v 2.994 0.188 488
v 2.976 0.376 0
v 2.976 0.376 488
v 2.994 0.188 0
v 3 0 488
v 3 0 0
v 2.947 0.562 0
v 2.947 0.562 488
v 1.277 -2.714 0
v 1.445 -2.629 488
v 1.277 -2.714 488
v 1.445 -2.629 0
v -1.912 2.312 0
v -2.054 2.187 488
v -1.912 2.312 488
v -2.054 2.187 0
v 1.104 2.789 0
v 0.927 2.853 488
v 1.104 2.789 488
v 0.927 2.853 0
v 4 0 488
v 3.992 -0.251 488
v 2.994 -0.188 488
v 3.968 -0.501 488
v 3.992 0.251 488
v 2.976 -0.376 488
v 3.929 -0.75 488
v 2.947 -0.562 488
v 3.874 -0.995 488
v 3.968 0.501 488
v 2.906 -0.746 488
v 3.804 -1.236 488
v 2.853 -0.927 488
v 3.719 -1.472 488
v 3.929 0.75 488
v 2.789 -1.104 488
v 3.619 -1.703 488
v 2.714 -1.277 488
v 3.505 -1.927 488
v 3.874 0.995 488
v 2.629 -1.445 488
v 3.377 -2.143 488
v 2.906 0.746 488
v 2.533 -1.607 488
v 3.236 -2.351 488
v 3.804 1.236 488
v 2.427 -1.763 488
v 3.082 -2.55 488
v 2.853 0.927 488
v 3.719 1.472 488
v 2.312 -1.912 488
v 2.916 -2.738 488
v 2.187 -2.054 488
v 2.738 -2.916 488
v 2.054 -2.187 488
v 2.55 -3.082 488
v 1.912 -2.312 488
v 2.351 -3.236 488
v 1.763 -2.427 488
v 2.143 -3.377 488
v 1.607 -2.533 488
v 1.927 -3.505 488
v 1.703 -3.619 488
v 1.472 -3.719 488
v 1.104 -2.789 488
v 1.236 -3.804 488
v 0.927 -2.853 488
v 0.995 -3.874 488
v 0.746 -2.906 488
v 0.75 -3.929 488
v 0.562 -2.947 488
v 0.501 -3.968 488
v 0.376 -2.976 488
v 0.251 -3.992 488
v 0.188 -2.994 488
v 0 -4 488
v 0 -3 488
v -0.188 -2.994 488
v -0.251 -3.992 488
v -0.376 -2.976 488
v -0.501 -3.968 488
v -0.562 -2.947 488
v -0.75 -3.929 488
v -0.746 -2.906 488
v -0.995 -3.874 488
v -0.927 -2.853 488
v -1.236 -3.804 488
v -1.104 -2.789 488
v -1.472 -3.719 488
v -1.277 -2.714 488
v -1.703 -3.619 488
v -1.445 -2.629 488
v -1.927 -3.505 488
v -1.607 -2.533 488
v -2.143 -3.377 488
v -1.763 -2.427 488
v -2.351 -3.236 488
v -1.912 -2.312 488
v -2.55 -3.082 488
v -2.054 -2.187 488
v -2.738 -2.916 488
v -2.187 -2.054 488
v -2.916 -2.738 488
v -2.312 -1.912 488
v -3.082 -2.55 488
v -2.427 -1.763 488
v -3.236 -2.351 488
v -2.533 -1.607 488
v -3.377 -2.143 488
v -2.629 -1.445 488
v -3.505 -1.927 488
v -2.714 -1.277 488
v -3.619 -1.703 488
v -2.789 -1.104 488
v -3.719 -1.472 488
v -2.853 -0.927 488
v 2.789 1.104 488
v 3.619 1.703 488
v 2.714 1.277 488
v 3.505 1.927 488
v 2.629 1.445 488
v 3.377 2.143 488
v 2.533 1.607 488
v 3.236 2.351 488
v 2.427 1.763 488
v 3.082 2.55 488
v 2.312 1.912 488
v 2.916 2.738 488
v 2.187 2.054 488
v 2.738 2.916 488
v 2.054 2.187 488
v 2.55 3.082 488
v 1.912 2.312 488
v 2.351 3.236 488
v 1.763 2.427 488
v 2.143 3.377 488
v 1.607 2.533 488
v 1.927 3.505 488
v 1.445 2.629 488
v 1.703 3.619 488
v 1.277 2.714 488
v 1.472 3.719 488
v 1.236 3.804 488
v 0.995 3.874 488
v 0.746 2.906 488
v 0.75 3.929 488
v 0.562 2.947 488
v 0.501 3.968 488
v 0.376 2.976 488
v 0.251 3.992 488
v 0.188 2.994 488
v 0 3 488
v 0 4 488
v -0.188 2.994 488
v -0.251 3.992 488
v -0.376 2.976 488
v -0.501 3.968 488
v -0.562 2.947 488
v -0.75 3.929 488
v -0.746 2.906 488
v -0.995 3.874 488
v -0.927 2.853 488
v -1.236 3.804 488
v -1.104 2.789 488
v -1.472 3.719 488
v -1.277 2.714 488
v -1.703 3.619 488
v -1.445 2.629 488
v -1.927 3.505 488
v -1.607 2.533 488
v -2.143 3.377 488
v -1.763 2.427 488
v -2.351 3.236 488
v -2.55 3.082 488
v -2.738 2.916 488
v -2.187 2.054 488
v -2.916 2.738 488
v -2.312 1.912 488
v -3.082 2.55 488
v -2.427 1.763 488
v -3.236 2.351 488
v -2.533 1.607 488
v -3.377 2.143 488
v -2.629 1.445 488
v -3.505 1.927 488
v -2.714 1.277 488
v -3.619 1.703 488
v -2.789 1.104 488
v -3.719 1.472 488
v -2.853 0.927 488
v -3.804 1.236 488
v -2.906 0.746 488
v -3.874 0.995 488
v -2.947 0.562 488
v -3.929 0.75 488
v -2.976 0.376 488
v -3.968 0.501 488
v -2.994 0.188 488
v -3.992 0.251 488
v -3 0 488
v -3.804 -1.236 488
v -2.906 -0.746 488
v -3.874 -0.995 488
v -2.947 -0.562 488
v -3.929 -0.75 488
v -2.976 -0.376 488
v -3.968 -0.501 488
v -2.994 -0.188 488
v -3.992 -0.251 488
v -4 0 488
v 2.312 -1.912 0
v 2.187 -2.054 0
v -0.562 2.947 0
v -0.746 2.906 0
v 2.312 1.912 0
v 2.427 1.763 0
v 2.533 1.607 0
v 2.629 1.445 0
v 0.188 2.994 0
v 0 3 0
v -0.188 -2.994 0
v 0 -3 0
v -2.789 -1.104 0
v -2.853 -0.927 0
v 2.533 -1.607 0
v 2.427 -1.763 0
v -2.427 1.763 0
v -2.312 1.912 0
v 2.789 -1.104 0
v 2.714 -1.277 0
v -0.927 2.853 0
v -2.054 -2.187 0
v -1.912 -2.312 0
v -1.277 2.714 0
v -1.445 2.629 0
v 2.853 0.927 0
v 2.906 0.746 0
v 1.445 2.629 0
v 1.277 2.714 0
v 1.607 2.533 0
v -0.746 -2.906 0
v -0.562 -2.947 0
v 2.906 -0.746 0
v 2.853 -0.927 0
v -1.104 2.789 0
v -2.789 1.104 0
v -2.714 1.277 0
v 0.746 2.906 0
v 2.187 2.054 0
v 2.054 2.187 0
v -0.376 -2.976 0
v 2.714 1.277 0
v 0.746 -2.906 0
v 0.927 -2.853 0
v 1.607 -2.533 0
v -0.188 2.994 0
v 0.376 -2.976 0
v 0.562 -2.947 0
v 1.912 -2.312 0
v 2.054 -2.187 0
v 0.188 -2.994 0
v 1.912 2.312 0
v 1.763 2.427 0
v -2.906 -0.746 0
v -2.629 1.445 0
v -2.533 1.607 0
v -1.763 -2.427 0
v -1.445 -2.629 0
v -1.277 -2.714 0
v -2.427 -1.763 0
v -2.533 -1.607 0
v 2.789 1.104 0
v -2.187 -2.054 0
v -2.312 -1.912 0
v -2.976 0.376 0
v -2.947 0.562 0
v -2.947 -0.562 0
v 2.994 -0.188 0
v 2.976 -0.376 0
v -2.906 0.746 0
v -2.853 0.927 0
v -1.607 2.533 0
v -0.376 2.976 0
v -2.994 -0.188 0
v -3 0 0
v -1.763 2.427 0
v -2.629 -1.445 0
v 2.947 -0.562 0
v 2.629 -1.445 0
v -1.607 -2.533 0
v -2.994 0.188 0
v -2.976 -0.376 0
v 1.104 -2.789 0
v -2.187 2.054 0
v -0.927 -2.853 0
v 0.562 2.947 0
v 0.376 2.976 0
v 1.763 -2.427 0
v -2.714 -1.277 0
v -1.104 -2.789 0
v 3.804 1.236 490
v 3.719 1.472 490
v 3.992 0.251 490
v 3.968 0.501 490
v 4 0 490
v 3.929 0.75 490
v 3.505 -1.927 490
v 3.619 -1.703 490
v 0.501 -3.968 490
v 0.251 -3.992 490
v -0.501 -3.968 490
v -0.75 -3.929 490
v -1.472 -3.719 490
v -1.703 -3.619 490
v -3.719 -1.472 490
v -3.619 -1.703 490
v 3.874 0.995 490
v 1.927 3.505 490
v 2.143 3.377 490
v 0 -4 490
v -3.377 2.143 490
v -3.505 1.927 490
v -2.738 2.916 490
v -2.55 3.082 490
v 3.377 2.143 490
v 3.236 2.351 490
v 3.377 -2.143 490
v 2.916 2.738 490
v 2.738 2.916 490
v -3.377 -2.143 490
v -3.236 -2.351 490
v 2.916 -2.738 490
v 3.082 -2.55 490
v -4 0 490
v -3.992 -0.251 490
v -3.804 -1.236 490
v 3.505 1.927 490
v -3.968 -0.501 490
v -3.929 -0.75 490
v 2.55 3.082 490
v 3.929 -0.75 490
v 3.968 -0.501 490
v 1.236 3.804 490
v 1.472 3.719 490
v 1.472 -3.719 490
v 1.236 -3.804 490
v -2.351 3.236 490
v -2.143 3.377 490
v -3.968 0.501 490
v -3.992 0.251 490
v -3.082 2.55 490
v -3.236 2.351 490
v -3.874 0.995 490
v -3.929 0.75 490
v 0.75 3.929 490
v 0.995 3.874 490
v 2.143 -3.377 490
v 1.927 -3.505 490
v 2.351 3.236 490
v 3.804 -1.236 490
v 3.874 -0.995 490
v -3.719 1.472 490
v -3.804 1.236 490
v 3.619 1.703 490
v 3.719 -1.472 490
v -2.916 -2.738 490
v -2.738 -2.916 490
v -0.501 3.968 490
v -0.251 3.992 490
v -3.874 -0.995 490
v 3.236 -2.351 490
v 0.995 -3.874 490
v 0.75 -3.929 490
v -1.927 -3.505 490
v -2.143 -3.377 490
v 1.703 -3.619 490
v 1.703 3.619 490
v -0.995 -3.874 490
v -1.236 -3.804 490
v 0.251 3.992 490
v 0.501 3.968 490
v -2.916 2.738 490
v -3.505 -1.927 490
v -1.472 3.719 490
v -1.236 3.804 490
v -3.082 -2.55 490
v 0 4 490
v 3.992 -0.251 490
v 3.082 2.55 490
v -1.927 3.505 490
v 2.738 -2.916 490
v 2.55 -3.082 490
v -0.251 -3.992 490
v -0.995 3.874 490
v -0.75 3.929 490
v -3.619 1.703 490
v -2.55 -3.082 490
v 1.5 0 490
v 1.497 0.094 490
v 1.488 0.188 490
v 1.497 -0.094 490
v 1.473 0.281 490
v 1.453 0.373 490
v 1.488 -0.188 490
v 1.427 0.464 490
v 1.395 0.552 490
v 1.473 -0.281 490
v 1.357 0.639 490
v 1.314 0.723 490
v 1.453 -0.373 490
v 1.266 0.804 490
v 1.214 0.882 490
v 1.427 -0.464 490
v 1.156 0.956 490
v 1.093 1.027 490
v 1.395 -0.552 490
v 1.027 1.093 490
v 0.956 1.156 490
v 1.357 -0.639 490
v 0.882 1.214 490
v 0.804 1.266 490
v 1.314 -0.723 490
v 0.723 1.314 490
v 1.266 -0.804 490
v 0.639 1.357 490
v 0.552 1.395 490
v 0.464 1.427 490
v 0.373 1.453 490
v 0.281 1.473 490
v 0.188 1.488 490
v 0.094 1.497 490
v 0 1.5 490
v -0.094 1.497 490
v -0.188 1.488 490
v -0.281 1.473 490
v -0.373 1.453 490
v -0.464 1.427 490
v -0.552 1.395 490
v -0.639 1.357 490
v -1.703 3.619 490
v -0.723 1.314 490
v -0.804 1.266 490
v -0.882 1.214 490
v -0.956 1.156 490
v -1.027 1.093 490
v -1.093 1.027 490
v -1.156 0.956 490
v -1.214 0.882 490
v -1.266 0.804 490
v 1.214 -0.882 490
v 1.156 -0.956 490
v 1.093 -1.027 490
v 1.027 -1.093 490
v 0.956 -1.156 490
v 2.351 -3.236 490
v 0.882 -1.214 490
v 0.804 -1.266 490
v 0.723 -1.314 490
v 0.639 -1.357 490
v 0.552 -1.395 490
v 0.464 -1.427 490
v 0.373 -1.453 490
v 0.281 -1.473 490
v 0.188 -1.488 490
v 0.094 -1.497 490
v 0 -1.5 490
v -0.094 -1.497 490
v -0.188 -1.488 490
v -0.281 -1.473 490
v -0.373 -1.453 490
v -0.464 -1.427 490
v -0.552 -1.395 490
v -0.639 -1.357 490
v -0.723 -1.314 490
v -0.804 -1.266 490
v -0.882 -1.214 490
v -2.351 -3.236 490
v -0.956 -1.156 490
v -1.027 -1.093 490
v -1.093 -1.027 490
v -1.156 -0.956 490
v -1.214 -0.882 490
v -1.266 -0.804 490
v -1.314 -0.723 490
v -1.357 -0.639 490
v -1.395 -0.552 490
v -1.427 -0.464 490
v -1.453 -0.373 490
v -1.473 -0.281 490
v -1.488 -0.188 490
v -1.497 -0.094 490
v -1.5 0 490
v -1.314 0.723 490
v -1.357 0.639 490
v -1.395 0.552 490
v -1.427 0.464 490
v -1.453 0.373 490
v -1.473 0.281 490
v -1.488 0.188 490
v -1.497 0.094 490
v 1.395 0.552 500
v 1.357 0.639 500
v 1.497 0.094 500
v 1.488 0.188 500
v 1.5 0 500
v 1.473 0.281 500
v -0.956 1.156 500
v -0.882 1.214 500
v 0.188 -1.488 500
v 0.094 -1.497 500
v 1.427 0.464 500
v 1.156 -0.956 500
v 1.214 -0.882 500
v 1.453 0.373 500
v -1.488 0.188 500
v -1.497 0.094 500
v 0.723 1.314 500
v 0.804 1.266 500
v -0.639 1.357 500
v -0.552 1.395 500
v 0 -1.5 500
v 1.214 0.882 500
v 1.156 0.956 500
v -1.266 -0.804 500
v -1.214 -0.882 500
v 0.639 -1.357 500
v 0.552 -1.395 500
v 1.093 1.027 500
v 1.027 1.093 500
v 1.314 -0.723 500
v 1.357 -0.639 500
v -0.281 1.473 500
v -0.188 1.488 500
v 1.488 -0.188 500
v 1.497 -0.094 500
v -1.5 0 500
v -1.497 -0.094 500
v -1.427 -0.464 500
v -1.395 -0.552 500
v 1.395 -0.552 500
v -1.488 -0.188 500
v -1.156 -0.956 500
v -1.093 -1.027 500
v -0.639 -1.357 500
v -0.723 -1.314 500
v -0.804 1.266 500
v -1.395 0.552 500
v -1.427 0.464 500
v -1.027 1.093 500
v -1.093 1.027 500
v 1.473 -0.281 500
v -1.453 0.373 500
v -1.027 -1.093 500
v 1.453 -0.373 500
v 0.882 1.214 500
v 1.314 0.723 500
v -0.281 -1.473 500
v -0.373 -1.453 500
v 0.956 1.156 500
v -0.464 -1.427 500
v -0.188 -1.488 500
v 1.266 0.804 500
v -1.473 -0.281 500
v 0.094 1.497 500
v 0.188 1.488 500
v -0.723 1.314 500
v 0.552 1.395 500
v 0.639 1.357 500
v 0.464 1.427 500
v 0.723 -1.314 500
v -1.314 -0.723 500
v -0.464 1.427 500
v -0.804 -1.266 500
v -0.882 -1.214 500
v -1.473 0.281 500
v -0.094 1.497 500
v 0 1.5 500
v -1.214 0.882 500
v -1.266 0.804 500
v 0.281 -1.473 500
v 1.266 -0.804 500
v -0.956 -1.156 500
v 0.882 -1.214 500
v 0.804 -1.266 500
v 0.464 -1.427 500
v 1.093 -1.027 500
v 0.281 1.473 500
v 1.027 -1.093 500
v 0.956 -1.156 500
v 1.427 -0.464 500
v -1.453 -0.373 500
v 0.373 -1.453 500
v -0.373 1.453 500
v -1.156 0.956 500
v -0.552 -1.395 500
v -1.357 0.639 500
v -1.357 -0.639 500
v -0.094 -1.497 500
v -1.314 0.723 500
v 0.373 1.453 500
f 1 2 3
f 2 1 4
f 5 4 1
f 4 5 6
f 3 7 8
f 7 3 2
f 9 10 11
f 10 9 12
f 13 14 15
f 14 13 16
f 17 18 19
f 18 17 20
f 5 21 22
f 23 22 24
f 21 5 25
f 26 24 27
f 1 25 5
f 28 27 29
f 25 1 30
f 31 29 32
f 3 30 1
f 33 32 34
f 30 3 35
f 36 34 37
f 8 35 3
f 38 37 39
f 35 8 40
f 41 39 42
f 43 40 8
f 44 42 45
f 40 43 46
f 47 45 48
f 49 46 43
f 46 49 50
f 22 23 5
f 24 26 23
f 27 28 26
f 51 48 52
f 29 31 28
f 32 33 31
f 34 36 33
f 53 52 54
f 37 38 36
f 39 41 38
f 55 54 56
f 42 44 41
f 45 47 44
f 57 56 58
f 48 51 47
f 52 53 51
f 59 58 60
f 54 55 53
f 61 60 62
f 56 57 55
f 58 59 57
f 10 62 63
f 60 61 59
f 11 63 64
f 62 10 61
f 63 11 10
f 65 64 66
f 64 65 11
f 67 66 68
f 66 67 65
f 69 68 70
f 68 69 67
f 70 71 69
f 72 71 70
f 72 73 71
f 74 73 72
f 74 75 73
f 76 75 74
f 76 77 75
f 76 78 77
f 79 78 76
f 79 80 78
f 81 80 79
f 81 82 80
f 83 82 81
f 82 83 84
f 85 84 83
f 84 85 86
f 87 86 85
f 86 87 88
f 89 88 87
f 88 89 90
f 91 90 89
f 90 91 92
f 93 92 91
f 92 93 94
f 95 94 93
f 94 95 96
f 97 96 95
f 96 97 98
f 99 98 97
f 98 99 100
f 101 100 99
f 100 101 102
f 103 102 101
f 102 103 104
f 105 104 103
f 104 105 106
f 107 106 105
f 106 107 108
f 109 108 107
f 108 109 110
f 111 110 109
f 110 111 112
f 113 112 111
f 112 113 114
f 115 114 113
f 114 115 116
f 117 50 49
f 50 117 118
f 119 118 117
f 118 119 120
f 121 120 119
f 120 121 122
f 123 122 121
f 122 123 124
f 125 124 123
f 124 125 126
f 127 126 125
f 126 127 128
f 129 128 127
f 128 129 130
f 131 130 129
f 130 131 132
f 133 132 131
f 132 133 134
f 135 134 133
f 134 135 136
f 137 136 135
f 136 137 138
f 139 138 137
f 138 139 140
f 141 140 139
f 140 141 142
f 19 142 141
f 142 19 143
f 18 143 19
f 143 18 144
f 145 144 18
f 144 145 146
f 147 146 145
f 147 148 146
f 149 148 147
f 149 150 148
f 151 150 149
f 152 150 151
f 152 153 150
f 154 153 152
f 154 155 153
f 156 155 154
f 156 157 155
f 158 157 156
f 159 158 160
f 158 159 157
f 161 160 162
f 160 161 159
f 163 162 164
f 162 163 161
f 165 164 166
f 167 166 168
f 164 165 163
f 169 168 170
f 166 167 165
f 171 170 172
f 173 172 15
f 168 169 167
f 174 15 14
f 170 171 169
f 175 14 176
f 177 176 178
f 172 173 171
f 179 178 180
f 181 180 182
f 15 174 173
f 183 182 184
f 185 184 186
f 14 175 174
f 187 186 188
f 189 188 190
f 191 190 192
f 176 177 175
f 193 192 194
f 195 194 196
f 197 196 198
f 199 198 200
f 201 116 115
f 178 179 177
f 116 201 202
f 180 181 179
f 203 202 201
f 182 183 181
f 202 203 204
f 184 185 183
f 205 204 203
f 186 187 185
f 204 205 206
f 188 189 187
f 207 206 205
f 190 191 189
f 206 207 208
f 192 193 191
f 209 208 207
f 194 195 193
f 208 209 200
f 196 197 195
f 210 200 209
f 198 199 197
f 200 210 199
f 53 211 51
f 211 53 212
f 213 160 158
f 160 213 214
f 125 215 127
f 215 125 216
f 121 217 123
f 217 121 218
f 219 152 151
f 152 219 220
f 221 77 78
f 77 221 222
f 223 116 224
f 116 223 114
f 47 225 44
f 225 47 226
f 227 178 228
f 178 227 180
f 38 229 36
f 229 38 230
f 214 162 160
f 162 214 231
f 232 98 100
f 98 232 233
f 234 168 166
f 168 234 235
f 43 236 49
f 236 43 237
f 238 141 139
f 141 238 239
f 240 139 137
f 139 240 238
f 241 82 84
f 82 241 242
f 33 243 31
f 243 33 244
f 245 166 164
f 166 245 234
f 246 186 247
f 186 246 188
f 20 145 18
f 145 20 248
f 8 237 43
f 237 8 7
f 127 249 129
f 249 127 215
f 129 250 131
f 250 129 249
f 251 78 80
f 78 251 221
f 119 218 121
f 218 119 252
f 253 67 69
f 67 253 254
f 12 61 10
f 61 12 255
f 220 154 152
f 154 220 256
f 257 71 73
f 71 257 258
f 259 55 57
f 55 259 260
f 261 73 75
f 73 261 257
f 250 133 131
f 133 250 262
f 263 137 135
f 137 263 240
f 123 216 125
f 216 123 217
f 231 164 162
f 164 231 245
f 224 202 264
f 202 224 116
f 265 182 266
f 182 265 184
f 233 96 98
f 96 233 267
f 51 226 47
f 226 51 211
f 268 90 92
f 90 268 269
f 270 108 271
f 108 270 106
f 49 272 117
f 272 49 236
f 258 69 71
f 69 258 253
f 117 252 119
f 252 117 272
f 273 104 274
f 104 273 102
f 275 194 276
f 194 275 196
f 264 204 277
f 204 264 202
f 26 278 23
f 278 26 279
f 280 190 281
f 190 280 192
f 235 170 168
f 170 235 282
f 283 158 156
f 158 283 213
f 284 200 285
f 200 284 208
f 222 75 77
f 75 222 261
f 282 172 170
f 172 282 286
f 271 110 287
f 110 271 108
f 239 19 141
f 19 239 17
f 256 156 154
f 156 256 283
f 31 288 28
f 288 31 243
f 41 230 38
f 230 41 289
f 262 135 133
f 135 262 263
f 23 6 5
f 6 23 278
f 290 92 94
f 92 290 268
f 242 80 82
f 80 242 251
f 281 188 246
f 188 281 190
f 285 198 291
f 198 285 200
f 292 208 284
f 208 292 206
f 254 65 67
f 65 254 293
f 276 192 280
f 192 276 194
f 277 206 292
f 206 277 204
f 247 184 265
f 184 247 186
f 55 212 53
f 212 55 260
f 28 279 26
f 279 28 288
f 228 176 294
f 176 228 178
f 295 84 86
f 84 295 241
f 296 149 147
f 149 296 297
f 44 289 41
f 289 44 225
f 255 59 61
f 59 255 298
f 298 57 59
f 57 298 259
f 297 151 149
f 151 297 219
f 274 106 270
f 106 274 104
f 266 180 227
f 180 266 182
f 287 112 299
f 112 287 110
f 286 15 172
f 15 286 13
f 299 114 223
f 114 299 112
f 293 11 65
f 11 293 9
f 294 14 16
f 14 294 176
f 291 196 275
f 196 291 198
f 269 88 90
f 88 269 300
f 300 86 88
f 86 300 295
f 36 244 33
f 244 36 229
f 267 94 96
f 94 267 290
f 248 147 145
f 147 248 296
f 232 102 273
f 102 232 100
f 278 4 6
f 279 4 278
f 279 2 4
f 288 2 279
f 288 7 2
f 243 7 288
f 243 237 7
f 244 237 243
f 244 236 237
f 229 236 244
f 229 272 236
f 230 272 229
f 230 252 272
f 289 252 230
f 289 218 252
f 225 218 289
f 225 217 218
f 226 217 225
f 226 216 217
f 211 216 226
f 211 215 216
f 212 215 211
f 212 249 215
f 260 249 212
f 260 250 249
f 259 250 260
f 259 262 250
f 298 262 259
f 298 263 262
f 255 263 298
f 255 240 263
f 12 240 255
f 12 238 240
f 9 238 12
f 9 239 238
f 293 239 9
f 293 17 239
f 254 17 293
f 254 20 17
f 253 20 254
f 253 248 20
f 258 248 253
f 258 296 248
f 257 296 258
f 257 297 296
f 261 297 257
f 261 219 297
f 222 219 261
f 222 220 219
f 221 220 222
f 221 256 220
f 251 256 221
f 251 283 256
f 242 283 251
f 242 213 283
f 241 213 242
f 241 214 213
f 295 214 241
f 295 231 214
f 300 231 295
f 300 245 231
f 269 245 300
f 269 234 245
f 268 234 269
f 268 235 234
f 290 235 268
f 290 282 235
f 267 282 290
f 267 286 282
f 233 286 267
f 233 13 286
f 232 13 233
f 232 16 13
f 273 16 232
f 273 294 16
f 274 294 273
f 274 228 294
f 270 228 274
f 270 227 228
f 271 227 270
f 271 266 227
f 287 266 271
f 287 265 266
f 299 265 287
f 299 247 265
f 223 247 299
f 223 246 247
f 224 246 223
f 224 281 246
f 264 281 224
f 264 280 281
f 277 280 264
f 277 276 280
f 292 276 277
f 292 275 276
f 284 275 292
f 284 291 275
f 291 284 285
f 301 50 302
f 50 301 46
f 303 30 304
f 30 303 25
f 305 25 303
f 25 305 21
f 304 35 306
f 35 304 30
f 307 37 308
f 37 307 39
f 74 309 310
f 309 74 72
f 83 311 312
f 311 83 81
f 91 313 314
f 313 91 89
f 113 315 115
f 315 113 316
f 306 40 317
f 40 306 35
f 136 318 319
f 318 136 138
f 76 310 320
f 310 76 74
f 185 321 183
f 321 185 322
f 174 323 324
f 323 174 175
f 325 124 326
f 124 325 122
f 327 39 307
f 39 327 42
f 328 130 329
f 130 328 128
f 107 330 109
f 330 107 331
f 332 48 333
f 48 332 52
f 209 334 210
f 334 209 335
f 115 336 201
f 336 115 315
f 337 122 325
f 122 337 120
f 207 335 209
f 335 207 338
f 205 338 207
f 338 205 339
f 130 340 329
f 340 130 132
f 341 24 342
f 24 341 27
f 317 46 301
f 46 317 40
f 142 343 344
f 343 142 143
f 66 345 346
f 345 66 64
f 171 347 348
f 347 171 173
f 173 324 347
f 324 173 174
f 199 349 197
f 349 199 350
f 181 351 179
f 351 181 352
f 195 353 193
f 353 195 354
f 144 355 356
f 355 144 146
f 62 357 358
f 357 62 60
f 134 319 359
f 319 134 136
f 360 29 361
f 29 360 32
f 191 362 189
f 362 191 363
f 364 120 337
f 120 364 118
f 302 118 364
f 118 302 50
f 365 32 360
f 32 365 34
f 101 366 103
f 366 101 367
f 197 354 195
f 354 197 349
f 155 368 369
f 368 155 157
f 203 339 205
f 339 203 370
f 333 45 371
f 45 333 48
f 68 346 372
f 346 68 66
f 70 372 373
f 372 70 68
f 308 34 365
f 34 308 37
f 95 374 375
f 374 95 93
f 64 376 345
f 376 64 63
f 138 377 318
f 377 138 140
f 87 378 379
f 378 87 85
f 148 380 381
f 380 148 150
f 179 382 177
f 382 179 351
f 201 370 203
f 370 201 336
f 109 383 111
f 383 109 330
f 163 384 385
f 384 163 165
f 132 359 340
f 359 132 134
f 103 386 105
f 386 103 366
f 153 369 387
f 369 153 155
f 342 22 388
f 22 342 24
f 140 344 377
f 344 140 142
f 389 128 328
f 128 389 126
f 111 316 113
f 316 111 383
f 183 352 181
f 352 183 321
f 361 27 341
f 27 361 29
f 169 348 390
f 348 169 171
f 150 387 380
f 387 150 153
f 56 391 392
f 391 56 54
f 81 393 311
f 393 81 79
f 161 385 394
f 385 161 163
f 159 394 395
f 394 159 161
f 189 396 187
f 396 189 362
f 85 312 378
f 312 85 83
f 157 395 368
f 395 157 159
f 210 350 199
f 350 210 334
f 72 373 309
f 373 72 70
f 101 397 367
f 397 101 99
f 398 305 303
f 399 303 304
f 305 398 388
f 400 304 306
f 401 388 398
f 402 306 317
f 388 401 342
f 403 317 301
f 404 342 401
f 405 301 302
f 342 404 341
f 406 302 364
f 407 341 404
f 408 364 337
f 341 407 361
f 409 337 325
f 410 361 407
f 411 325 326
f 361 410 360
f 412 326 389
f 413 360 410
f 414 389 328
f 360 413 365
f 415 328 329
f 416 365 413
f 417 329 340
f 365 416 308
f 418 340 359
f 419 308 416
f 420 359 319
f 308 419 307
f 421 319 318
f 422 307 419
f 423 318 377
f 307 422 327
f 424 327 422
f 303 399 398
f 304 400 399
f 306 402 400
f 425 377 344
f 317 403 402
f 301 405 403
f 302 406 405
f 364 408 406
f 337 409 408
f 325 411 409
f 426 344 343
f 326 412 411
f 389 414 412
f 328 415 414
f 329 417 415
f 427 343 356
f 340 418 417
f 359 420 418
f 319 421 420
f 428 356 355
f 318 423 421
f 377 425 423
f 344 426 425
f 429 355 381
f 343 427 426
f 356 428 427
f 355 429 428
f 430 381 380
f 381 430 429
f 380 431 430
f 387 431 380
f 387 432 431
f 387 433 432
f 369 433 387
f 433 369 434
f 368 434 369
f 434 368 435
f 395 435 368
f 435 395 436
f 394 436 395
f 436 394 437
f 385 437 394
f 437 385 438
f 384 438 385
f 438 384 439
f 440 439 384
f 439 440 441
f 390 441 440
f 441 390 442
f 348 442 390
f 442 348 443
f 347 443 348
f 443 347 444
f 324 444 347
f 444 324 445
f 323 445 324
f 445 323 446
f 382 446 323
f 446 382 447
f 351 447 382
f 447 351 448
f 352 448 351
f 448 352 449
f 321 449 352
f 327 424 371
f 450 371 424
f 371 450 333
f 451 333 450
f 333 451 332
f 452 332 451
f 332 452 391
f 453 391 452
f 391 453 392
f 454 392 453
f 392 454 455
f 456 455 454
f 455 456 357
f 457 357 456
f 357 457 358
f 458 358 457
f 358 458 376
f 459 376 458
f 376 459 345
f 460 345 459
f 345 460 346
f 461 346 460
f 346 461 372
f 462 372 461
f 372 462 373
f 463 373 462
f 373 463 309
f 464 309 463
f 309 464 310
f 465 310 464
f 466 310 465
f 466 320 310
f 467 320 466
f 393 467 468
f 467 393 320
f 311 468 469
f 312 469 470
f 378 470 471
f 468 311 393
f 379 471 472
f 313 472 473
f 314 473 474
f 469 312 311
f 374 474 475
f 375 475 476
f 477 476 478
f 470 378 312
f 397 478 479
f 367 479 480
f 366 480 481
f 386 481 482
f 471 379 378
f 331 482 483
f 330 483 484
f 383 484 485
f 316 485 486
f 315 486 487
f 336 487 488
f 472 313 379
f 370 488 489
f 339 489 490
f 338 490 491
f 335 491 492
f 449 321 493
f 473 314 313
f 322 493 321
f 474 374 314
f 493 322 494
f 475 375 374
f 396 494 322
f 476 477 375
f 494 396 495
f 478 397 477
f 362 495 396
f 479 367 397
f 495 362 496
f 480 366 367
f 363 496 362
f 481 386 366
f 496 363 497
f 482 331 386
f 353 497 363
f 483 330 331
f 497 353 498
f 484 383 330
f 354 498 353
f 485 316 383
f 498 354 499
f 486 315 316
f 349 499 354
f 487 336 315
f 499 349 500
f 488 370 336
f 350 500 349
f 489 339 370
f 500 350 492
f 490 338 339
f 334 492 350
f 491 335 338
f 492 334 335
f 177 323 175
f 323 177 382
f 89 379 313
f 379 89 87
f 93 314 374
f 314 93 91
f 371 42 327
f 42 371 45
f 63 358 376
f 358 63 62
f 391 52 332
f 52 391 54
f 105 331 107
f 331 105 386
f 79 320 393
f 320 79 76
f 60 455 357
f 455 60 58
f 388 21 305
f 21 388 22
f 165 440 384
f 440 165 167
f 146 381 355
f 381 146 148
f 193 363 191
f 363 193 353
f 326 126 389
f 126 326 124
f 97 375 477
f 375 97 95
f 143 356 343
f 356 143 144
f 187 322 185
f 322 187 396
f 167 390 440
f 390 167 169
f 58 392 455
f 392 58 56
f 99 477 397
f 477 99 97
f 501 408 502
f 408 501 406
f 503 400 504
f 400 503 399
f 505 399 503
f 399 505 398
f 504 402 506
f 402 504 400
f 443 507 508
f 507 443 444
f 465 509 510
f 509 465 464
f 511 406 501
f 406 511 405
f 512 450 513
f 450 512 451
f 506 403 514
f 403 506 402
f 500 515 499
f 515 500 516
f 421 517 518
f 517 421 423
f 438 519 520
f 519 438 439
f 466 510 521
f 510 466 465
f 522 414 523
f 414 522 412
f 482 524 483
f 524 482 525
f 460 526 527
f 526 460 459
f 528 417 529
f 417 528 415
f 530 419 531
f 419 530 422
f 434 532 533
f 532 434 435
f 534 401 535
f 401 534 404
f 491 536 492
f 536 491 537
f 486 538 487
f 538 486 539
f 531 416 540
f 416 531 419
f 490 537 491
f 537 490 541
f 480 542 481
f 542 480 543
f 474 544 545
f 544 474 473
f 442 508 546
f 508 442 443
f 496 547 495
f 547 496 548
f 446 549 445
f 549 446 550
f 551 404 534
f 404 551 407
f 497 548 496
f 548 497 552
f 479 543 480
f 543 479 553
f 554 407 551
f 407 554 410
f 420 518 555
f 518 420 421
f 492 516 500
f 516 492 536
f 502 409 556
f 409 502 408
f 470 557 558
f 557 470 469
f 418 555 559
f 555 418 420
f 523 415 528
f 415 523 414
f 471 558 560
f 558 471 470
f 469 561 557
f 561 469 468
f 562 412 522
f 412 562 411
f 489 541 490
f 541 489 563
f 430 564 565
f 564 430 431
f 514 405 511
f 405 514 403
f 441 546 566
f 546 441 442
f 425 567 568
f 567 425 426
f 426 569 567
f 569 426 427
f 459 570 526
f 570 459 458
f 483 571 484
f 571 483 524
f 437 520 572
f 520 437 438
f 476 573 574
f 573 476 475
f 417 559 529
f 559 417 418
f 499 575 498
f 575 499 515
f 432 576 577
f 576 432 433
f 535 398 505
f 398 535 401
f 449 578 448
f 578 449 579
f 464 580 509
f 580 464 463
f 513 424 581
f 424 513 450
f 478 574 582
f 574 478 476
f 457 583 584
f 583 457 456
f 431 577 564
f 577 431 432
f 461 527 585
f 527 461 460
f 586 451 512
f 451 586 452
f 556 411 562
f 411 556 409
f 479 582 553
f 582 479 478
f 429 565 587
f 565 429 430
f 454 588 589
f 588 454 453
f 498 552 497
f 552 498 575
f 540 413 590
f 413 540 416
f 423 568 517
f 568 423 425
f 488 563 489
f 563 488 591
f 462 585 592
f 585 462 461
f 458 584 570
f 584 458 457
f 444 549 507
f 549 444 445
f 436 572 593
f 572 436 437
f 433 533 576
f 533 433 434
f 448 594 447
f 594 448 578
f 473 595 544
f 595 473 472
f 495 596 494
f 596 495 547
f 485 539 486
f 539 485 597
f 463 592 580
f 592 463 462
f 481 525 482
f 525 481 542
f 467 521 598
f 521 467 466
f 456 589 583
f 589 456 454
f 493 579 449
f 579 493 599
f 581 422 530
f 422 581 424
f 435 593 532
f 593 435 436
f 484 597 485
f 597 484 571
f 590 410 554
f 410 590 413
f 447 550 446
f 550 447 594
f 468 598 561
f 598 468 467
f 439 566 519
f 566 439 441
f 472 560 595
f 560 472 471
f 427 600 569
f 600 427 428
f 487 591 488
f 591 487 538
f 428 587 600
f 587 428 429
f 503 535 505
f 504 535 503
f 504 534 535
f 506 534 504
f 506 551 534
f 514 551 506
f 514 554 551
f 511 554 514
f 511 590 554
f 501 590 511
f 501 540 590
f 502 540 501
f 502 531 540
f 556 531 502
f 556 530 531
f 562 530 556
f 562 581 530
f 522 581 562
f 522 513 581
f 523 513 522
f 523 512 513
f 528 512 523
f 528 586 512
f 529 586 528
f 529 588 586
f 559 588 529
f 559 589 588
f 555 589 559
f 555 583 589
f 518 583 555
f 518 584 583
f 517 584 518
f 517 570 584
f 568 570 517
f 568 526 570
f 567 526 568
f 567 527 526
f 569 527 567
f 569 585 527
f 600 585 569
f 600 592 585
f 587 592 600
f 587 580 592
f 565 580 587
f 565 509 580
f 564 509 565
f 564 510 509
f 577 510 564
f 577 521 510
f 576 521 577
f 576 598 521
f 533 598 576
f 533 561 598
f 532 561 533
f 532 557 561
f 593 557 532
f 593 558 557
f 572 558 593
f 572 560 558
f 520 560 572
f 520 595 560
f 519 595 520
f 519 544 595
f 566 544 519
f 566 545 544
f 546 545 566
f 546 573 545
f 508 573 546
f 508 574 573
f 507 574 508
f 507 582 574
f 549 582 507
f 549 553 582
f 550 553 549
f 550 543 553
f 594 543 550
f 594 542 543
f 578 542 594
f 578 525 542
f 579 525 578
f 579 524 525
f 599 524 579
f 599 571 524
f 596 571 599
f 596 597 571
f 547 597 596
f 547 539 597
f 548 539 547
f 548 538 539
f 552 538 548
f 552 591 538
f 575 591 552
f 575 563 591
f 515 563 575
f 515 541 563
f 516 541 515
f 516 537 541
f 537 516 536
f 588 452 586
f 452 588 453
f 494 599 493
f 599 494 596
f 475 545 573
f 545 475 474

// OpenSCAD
// Parámetros generales
varilla_largo = 500;        // Largo total
varilla_diametro = 6;
pico_largo = 10;            // Parte final de 3 mm
pico_diametro = 3;
base_top_diametro = 8;
base_top_altura = 2;

// Cuerpo principal de la varilla
cylinder(h = varilla_largo - pico_largo - base_top_altura, d = varilla_diametro, $fn = 100);

// Parte superior - tope (donde apoya la cuchilla)
translate([0, 0, varilla_largo - pico_largo - base_top_altura])
    cylinder(h = base_top_altura, d = base_top_diametro, $fn = 100);

// Parte superior - eje de 3 mm
translate([0, 0, varilla_largo - pico_largo])
    cylinder(h = pico_largo, d = pico_diametro, $fn = 100);
